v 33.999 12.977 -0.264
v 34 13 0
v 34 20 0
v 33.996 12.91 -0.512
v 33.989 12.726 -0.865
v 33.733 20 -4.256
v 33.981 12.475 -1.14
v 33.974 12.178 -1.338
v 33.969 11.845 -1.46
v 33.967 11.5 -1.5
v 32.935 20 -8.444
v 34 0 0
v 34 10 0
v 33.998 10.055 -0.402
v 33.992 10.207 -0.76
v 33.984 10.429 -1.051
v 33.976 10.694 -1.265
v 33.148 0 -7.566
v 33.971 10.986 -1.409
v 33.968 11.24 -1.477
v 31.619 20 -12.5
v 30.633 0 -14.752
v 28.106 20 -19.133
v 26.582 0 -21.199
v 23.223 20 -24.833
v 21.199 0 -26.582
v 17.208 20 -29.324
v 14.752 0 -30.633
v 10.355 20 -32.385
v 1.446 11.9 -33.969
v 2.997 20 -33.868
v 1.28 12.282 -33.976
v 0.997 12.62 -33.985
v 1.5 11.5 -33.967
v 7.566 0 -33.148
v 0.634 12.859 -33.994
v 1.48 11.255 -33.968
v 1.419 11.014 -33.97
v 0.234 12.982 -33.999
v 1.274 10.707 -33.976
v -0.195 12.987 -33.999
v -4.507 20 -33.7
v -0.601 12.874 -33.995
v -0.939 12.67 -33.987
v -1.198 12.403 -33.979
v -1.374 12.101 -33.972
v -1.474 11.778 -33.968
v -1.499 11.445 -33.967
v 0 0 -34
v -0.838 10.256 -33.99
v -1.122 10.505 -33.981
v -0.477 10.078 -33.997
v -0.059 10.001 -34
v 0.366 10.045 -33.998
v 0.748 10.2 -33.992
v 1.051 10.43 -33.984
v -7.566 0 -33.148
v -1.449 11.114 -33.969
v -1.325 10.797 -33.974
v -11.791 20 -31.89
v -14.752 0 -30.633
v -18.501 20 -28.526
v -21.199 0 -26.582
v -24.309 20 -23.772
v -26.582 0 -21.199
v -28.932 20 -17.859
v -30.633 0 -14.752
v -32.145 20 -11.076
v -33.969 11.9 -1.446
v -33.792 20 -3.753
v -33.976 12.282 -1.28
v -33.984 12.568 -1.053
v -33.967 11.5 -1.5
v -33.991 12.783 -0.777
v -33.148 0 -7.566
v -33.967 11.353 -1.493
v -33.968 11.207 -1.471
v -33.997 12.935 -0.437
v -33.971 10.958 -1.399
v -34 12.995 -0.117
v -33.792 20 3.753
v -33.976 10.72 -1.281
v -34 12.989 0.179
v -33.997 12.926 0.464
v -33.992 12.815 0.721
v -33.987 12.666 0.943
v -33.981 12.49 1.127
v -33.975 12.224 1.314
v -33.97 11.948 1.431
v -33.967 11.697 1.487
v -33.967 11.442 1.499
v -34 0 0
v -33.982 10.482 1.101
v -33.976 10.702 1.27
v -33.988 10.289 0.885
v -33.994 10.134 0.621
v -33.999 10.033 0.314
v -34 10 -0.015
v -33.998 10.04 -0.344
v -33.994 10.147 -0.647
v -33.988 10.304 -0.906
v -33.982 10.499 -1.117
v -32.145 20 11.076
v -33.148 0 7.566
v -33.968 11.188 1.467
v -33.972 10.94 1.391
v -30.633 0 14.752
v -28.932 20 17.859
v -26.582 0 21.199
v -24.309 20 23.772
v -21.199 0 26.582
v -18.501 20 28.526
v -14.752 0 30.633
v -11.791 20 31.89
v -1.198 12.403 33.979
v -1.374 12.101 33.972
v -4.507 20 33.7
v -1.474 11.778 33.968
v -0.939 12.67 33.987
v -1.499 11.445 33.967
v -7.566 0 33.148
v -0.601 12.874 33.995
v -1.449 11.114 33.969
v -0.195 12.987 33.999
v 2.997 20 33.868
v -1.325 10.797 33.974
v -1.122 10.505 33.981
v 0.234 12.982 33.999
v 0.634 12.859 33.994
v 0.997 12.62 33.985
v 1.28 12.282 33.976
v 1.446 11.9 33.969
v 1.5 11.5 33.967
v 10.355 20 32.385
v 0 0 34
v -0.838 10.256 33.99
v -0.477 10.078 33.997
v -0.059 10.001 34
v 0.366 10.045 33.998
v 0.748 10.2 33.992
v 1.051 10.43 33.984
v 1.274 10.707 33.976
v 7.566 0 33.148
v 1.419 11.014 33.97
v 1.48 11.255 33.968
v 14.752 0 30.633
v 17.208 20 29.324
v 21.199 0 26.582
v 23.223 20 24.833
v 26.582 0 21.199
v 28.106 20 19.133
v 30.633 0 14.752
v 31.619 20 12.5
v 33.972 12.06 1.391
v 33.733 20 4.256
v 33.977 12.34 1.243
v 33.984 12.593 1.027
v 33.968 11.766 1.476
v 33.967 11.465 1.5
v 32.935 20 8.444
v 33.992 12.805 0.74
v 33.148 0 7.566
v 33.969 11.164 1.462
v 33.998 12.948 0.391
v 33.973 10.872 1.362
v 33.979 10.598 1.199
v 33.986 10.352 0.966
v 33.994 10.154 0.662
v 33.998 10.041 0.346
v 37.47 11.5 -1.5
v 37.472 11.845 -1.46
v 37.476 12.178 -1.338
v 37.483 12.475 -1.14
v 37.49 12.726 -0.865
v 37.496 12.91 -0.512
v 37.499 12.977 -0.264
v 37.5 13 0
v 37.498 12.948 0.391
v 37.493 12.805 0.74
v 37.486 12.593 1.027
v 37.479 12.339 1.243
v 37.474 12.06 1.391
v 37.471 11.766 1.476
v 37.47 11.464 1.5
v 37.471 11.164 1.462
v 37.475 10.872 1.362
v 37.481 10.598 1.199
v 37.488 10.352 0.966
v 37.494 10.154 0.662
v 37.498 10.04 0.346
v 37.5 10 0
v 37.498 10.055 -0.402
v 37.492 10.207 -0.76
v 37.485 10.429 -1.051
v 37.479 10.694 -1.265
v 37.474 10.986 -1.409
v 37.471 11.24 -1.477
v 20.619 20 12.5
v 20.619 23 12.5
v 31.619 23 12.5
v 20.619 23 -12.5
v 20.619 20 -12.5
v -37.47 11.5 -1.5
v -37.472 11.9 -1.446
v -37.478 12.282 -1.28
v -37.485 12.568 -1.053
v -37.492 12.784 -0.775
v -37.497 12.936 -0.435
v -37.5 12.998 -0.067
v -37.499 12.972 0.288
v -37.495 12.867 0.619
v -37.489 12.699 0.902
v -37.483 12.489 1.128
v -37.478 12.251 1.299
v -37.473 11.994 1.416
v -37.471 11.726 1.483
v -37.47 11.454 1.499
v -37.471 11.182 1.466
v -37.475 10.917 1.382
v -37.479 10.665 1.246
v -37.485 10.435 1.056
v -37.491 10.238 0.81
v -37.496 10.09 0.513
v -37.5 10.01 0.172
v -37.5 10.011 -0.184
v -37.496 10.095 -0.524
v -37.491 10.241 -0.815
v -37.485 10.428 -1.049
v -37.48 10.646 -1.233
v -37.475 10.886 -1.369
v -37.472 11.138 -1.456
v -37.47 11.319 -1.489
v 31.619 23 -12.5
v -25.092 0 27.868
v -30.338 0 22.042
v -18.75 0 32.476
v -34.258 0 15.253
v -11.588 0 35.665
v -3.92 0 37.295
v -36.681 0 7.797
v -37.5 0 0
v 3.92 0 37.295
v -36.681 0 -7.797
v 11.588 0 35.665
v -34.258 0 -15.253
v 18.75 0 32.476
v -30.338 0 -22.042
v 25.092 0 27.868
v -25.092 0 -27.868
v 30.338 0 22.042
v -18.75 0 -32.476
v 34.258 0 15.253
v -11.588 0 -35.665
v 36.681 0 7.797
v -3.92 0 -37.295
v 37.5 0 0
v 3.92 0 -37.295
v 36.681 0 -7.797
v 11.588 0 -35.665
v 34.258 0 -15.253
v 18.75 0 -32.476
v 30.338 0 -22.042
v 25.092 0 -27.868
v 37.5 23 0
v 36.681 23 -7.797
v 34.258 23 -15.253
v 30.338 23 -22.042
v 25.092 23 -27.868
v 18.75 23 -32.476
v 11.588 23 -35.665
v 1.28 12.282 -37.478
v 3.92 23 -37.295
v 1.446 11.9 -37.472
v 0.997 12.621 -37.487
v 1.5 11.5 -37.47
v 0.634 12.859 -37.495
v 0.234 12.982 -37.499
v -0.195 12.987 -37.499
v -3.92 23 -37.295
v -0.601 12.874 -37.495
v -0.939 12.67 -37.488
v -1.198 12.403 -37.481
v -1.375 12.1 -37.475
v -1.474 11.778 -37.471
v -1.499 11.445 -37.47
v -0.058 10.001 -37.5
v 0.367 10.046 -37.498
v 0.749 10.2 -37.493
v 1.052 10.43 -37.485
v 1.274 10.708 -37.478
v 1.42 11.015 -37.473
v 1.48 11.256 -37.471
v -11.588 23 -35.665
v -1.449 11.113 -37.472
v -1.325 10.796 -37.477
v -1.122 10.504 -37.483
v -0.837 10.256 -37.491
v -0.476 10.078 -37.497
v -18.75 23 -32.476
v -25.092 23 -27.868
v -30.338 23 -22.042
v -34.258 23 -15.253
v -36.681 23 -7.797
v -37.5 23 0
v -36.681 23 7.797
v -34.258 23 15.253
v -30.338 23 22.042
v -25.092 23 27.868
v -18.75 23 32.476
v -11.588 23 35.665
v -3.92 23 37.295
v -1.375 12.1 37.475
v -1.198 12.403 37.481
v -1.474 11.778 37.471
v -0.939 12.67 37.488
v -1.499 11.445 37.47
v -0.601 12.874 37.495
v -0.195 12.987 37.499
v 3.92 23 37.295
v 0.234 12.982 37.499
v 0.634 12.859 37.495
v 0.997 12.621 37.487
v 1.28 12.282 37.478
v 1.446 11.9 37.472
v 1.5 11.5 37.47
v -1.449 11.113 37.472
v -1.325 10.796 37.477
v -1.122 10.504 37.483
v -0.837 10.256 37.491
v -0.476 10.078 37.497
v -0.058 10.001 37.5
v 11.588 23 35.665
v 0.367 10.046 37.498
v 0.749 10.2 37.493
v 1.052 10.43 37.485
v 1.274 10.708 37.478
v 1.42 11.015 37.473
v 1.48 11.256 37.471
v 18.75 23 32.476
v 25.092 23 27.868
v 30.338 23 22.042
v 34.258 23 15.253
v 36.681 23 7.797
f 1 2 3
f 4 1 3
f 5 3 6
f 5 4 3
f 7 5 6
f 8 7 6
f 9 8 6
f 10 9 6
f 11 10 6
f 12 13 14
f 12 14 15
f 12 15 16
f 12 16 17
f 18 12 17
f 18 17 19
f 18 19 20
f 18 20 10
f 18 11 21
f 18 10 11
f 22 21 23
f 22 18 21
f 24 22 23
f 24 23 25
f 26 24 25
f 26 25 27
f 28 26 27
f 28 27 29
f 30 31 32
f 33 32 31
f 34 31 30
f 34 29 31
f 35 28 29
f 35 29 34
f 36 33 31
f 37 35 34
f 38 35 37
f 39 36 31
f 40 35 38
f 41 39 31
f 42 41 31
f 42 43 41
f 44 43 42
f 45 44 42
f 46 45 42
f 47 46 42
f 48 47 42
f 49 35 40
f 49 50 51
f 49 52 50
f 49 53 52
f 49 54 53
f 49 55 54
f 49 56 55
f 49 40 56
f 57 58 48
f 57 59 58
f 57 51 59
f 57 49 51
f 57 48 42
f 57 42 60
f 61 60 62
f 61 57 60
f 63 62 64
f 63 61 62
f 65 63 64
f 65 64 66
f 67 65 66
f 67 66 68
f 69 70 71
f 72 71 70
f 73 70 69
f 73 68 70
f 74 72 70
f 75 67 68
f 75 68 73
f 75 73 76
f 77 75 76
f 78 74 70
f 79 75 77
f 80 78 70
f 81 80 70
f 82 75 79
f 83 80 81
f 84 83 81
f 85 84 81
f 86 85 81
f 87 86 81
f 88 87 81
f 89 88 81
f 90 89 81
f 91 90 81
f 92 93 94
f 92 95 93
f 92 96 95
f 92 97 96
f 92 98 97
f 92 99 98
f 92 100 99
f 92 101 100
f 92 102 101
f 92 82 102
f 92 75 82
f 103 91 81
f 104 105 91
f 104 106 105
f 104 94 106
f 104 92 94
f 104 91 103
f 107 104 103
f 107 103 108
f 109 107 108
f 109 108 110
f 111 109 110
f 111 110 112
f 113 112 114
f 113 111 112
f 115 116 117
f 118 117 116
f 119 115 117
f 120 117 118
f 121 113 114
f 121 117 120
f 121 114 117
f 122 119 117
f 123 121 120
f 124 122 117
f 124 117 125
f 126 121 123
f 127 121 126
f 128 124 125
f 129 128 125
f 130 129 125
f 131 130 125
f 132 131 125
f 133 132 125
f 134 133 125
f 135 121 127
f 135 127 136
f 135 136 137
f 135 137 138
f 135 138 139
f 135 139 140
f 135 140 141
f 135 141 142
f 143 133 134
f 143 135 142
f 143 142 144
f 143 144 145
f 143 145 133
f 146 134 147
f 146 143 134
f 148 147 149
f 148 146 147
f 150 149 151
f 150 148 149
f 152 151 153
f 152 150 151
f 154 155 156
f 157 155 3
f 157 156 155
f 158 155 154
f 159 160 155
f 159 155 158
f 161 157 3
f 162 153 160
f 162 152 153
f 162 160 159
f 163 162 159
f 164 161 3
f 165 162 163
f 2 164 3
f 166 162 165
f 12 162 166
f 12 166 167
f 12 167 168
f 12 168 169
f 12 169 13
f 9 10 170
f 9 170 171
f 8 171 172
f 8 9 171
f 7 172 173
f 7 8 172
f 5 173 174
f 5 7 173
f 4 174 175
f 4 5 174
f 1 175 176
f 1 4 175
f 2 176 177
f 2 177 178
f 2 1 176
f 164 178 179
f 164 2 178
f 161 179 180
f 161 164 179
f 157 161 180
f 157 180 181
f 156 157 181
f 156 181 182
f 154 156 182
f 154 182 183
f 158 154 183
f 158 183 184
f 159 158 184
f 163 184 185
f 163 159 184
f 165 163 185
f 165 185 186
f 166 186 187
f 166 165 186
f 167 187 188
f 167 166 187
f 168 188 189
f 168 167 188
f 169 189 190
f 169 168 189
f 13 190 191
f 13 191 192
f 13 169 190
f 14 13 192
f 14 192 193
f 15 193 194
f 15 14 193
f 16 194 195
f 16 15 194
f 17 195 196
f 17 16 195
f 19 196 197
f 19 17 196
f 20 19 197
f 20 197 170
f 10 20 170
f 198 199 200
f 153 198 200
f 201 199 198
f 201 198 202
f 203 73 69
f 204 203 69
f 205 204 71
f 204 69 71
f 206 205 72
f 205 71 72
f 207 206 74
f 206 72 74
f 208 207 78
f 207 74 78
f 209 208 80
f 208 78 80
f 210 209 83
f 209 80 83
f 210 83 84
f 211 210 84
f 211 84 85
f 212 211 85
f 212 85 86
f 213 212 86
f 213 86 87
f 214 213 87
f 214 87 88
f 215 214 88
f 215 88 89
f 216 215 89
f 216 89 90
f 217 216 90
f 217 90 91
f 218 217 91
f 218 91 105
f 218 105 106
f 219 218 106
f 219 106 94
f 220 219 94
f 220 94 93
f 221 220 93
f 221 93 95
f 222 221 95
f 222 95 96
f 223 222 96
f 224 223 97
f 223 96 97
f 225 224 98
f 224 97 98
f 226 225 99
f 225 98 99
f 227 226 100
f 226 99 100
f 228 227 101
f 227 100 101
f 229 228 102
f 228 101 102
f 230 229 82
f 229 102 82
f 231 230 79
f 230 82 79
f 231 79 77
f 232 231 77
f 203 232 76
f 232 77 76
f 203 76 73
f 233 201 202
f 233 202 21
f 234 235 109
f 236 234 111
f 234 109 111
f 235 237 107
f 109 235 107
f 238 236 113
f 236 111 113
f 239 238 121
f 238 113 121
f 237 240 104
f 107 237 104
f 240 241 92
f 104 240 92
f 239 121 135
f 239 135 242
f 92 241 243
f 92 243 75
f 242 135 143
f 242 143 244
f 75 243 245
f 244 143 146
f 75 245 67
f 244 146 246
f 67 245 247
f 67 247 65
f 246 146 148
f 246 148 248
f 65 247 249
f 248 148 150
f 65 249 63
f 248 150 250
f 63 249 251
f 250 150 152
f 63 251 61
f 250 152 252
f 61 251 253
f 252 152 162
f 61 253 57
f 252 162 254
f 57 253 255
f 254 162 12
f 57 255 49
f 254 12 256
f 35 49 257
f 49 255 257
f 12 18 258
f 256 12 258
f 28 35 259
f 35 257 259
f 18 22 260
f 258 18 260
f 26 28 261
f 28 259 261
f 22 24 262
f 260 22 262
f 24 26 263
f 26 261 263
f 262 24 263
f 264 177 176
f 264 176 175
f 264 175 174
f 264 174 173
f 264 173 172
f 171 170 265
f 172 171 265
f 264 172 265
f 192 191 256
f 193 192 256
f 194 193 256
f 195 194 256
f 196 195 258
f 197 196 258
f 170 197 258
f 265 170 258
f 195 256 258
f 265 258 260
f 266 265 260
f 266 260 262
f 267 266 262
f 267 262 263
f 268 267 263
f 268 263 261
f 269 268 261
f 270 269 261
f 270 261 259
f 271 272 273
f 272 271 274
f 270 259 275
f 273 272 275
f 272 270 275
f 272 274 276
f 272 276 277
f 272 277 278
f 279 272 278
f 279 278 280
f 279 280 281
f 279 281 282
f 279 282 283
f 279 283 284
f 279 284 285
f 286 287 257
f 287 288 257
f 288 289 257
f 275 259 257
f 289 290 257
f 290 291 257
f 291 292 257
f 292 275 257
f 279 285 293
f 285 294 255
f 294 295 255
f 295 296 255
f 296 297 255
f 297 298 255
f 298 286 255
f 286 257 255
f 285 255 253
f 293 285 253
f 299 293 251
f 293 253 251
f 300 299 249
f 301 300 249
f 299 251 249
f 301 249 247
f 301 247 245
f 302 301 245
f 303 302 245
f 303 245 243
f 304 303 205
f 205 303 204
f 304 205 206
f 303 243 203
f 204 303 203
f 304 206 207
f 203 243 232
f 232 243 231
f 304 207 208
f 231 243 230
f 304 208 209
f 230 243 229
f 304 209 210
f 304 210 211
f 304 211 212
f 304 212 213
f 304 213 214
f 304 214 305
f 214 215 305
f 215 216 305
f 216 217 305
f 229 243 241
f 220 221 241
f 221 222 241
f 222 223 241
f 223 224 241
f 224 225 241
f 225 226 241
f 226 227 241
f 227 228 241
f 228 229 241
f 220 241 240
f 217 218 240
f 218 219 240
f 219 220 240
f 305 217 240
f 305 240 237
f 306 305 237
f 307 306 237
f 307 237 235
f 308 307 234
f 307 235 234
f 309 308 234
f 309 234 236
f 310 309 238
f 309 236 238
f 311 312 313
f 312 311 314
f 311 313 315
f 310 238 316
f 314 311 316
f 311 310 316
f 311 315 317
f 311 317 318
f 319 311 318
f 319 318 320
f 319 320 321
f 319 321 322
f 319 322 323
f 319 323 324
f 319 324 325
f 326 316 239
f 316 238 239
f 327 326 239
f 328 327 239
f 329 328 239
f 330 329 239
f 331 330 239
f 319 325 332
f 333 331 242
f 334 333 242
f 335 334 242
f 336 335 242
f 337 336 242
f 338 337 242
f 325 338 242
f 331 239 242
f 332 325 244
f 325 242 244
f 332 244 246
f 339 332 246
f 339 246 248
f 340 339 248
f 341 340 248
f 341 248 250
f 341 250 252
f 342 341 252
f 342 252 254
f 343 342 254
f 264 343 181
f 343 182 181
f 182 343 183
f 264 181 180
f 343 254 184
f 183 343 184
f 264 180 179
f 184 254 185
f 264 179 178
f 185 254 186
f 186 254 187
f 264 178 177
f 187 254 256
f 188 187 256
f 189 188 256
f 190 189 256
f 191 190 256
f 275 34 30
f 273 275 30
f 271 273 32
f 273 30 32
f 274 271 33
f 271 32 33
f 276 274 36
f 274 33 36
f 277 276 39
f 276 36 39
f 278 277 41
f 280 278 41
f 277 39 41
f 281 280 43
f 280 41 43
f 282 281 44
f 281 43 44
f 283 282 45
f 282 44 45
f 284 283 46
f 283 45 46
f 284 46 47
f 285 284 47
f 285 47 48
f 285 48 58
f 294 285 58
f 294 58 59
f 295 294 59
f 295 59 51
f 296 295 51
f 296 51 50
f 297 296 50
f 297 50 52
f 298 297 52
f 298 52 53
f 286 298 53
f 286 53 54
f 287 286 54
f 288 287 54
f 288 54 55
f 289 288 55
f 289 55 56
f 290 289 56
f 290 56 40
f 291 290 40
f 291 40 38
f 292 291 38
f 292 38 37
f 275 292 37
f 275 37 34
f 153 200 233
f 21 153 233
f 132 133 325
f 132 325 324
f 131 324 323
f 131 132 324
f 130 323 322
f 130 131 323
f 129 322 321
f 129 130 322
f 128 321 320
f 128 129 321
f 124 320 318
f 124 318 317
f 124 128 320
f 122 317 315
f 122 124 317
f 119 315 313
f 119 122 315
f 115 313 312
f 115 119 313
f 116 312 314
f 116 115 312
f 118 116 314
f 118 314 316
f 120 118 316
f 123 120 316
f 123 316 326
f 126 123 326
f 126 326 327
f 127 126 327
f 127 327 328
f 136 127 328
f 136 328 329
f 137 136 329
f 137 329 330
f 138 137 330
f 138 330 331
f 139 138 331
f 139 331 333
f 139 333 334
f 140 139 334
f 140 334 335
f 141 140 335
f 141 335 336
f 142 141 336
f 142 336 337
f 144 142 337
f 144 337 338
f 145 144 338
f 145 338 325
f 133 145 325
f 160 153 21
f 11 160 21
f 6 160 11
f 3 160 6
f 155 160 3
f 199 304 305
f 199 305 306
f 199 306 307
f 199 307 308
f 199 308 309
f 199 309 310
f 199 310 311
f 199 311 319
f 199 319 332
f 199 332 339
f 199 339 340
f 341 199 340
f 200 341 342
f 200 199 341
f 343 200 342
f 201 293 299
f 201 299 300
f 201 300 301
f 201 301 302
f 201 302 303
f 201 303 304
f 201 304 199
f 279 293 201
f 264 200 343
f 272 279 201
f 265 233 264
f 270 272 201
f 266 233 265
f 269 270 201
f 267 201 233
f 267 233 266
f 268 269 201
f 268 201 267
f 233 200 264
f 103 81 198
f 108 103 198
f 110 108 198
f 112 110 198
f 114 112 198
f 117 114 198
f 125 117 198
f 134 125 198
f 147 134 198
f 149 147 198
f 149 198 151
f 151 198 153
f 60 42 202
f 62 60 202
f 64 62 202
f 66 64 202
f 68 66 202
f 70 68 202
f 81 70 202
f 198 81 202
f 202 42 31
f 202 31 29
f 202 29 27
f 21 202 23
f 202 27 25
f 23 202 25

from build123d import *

# Parameters (mm, degrees)
SKETCH1_R               = 37.5
SKETCH1_R_2             = 34
BOSS_EXTRUDE1_DEPTH     = 20
SKETCH2_R               = 37.5
BOSS_EXTRUDE2_DEPTH     = 3
SKETCH3_W               = 11
SKETCH3_H               = 25
CUT_EXTRUDE1_DEPTH      = 3
SKETCH4_R               = 1.5
CUT_EXTRUDE2_DEPTH      = 80
CUT_EXTRUDE2_DEPTH_BACK = 80
SKETCH5_R               = 1.5
CUT_EXTRUDE4_DEPTH      = 80
CUT_EXTRUDE4_DEPTH_BACK = 80


with BuildPart() as part:
    # Sketch1 → Boss-Extrude1 (new body)
    with BuildSketch(Plane(origin=(0, 0, 0), x_dir=(1, 0, 0), z_dir=(0, 1, 0))):
        Circle(SKETCH1_R)
        Circle(SKETCH1_R_2, mode=Mode.SUBTRACT)
    extrude(amount=BOSS_EXTRUDE1_DEPTH)

    # Sketch2 → Boss-Extrude2 (add)
    with BuildSketch(Plane(origin=(0, 20, 0), x_dir=(1, 0, 0), z_dir=(0, 1, 0))):
        Circle(SKETCH2_R)
    extrude(amount=BOSS_EXTRUDE2_DEPTH)

    # Sketch3 → Cut-Extrude1 (cut)
    with BuildSketch(Plane(origin=(0, 23, 0), x_dir=(1, 0, 0), z_dir=(0, 1, 0))):
        with Locations((26.118823508, 0)):
            Rectangle(SKETCH3_W, SKETCH3_H)
    extrude(amount=-CUT_EXTRUDE1_DEPTH, mode=Mode.SUBTRACT)

    # Sketch4 → Cut-Extrude2 (cut, two sides)
    with BuildSketch(Plane.XY) as cut_extrude2_sk:
        with Locations((0, 11.5)):
            Circle(SKETCH4_R)
    extrude(amount=CUT_EXTRUDE2_DEPTH, mode=Mode.SUBTRACT)
    extrude(cut_extrude2_sk.sketch, amount=-CUT_EXTRUDE2_DEPTH_BACK, mode=Mode.SUBTRACT)

    # Sketch5 → Cut-Extrude4 (cut, two sides)
    with BuildSketch(Plane(origin=(0, 0, 0), x_dir=(0, 0, -1), z_dir=(1, 0, 0))) as cut_extrude4_sk:
        with Locations((0, 11.5)):
            Circle(SKETCH5_R)
    extrude(amount=CUT_EXTRUDE4_DEPTH, mode=Mode.SUBTRACT)
    extrude(cut_extrude4_sk.sketch, amount=-CUT_EXTRUDE4_DEPTH_BACK, mode=Mode.SUBTRACT)


solid = part.part
